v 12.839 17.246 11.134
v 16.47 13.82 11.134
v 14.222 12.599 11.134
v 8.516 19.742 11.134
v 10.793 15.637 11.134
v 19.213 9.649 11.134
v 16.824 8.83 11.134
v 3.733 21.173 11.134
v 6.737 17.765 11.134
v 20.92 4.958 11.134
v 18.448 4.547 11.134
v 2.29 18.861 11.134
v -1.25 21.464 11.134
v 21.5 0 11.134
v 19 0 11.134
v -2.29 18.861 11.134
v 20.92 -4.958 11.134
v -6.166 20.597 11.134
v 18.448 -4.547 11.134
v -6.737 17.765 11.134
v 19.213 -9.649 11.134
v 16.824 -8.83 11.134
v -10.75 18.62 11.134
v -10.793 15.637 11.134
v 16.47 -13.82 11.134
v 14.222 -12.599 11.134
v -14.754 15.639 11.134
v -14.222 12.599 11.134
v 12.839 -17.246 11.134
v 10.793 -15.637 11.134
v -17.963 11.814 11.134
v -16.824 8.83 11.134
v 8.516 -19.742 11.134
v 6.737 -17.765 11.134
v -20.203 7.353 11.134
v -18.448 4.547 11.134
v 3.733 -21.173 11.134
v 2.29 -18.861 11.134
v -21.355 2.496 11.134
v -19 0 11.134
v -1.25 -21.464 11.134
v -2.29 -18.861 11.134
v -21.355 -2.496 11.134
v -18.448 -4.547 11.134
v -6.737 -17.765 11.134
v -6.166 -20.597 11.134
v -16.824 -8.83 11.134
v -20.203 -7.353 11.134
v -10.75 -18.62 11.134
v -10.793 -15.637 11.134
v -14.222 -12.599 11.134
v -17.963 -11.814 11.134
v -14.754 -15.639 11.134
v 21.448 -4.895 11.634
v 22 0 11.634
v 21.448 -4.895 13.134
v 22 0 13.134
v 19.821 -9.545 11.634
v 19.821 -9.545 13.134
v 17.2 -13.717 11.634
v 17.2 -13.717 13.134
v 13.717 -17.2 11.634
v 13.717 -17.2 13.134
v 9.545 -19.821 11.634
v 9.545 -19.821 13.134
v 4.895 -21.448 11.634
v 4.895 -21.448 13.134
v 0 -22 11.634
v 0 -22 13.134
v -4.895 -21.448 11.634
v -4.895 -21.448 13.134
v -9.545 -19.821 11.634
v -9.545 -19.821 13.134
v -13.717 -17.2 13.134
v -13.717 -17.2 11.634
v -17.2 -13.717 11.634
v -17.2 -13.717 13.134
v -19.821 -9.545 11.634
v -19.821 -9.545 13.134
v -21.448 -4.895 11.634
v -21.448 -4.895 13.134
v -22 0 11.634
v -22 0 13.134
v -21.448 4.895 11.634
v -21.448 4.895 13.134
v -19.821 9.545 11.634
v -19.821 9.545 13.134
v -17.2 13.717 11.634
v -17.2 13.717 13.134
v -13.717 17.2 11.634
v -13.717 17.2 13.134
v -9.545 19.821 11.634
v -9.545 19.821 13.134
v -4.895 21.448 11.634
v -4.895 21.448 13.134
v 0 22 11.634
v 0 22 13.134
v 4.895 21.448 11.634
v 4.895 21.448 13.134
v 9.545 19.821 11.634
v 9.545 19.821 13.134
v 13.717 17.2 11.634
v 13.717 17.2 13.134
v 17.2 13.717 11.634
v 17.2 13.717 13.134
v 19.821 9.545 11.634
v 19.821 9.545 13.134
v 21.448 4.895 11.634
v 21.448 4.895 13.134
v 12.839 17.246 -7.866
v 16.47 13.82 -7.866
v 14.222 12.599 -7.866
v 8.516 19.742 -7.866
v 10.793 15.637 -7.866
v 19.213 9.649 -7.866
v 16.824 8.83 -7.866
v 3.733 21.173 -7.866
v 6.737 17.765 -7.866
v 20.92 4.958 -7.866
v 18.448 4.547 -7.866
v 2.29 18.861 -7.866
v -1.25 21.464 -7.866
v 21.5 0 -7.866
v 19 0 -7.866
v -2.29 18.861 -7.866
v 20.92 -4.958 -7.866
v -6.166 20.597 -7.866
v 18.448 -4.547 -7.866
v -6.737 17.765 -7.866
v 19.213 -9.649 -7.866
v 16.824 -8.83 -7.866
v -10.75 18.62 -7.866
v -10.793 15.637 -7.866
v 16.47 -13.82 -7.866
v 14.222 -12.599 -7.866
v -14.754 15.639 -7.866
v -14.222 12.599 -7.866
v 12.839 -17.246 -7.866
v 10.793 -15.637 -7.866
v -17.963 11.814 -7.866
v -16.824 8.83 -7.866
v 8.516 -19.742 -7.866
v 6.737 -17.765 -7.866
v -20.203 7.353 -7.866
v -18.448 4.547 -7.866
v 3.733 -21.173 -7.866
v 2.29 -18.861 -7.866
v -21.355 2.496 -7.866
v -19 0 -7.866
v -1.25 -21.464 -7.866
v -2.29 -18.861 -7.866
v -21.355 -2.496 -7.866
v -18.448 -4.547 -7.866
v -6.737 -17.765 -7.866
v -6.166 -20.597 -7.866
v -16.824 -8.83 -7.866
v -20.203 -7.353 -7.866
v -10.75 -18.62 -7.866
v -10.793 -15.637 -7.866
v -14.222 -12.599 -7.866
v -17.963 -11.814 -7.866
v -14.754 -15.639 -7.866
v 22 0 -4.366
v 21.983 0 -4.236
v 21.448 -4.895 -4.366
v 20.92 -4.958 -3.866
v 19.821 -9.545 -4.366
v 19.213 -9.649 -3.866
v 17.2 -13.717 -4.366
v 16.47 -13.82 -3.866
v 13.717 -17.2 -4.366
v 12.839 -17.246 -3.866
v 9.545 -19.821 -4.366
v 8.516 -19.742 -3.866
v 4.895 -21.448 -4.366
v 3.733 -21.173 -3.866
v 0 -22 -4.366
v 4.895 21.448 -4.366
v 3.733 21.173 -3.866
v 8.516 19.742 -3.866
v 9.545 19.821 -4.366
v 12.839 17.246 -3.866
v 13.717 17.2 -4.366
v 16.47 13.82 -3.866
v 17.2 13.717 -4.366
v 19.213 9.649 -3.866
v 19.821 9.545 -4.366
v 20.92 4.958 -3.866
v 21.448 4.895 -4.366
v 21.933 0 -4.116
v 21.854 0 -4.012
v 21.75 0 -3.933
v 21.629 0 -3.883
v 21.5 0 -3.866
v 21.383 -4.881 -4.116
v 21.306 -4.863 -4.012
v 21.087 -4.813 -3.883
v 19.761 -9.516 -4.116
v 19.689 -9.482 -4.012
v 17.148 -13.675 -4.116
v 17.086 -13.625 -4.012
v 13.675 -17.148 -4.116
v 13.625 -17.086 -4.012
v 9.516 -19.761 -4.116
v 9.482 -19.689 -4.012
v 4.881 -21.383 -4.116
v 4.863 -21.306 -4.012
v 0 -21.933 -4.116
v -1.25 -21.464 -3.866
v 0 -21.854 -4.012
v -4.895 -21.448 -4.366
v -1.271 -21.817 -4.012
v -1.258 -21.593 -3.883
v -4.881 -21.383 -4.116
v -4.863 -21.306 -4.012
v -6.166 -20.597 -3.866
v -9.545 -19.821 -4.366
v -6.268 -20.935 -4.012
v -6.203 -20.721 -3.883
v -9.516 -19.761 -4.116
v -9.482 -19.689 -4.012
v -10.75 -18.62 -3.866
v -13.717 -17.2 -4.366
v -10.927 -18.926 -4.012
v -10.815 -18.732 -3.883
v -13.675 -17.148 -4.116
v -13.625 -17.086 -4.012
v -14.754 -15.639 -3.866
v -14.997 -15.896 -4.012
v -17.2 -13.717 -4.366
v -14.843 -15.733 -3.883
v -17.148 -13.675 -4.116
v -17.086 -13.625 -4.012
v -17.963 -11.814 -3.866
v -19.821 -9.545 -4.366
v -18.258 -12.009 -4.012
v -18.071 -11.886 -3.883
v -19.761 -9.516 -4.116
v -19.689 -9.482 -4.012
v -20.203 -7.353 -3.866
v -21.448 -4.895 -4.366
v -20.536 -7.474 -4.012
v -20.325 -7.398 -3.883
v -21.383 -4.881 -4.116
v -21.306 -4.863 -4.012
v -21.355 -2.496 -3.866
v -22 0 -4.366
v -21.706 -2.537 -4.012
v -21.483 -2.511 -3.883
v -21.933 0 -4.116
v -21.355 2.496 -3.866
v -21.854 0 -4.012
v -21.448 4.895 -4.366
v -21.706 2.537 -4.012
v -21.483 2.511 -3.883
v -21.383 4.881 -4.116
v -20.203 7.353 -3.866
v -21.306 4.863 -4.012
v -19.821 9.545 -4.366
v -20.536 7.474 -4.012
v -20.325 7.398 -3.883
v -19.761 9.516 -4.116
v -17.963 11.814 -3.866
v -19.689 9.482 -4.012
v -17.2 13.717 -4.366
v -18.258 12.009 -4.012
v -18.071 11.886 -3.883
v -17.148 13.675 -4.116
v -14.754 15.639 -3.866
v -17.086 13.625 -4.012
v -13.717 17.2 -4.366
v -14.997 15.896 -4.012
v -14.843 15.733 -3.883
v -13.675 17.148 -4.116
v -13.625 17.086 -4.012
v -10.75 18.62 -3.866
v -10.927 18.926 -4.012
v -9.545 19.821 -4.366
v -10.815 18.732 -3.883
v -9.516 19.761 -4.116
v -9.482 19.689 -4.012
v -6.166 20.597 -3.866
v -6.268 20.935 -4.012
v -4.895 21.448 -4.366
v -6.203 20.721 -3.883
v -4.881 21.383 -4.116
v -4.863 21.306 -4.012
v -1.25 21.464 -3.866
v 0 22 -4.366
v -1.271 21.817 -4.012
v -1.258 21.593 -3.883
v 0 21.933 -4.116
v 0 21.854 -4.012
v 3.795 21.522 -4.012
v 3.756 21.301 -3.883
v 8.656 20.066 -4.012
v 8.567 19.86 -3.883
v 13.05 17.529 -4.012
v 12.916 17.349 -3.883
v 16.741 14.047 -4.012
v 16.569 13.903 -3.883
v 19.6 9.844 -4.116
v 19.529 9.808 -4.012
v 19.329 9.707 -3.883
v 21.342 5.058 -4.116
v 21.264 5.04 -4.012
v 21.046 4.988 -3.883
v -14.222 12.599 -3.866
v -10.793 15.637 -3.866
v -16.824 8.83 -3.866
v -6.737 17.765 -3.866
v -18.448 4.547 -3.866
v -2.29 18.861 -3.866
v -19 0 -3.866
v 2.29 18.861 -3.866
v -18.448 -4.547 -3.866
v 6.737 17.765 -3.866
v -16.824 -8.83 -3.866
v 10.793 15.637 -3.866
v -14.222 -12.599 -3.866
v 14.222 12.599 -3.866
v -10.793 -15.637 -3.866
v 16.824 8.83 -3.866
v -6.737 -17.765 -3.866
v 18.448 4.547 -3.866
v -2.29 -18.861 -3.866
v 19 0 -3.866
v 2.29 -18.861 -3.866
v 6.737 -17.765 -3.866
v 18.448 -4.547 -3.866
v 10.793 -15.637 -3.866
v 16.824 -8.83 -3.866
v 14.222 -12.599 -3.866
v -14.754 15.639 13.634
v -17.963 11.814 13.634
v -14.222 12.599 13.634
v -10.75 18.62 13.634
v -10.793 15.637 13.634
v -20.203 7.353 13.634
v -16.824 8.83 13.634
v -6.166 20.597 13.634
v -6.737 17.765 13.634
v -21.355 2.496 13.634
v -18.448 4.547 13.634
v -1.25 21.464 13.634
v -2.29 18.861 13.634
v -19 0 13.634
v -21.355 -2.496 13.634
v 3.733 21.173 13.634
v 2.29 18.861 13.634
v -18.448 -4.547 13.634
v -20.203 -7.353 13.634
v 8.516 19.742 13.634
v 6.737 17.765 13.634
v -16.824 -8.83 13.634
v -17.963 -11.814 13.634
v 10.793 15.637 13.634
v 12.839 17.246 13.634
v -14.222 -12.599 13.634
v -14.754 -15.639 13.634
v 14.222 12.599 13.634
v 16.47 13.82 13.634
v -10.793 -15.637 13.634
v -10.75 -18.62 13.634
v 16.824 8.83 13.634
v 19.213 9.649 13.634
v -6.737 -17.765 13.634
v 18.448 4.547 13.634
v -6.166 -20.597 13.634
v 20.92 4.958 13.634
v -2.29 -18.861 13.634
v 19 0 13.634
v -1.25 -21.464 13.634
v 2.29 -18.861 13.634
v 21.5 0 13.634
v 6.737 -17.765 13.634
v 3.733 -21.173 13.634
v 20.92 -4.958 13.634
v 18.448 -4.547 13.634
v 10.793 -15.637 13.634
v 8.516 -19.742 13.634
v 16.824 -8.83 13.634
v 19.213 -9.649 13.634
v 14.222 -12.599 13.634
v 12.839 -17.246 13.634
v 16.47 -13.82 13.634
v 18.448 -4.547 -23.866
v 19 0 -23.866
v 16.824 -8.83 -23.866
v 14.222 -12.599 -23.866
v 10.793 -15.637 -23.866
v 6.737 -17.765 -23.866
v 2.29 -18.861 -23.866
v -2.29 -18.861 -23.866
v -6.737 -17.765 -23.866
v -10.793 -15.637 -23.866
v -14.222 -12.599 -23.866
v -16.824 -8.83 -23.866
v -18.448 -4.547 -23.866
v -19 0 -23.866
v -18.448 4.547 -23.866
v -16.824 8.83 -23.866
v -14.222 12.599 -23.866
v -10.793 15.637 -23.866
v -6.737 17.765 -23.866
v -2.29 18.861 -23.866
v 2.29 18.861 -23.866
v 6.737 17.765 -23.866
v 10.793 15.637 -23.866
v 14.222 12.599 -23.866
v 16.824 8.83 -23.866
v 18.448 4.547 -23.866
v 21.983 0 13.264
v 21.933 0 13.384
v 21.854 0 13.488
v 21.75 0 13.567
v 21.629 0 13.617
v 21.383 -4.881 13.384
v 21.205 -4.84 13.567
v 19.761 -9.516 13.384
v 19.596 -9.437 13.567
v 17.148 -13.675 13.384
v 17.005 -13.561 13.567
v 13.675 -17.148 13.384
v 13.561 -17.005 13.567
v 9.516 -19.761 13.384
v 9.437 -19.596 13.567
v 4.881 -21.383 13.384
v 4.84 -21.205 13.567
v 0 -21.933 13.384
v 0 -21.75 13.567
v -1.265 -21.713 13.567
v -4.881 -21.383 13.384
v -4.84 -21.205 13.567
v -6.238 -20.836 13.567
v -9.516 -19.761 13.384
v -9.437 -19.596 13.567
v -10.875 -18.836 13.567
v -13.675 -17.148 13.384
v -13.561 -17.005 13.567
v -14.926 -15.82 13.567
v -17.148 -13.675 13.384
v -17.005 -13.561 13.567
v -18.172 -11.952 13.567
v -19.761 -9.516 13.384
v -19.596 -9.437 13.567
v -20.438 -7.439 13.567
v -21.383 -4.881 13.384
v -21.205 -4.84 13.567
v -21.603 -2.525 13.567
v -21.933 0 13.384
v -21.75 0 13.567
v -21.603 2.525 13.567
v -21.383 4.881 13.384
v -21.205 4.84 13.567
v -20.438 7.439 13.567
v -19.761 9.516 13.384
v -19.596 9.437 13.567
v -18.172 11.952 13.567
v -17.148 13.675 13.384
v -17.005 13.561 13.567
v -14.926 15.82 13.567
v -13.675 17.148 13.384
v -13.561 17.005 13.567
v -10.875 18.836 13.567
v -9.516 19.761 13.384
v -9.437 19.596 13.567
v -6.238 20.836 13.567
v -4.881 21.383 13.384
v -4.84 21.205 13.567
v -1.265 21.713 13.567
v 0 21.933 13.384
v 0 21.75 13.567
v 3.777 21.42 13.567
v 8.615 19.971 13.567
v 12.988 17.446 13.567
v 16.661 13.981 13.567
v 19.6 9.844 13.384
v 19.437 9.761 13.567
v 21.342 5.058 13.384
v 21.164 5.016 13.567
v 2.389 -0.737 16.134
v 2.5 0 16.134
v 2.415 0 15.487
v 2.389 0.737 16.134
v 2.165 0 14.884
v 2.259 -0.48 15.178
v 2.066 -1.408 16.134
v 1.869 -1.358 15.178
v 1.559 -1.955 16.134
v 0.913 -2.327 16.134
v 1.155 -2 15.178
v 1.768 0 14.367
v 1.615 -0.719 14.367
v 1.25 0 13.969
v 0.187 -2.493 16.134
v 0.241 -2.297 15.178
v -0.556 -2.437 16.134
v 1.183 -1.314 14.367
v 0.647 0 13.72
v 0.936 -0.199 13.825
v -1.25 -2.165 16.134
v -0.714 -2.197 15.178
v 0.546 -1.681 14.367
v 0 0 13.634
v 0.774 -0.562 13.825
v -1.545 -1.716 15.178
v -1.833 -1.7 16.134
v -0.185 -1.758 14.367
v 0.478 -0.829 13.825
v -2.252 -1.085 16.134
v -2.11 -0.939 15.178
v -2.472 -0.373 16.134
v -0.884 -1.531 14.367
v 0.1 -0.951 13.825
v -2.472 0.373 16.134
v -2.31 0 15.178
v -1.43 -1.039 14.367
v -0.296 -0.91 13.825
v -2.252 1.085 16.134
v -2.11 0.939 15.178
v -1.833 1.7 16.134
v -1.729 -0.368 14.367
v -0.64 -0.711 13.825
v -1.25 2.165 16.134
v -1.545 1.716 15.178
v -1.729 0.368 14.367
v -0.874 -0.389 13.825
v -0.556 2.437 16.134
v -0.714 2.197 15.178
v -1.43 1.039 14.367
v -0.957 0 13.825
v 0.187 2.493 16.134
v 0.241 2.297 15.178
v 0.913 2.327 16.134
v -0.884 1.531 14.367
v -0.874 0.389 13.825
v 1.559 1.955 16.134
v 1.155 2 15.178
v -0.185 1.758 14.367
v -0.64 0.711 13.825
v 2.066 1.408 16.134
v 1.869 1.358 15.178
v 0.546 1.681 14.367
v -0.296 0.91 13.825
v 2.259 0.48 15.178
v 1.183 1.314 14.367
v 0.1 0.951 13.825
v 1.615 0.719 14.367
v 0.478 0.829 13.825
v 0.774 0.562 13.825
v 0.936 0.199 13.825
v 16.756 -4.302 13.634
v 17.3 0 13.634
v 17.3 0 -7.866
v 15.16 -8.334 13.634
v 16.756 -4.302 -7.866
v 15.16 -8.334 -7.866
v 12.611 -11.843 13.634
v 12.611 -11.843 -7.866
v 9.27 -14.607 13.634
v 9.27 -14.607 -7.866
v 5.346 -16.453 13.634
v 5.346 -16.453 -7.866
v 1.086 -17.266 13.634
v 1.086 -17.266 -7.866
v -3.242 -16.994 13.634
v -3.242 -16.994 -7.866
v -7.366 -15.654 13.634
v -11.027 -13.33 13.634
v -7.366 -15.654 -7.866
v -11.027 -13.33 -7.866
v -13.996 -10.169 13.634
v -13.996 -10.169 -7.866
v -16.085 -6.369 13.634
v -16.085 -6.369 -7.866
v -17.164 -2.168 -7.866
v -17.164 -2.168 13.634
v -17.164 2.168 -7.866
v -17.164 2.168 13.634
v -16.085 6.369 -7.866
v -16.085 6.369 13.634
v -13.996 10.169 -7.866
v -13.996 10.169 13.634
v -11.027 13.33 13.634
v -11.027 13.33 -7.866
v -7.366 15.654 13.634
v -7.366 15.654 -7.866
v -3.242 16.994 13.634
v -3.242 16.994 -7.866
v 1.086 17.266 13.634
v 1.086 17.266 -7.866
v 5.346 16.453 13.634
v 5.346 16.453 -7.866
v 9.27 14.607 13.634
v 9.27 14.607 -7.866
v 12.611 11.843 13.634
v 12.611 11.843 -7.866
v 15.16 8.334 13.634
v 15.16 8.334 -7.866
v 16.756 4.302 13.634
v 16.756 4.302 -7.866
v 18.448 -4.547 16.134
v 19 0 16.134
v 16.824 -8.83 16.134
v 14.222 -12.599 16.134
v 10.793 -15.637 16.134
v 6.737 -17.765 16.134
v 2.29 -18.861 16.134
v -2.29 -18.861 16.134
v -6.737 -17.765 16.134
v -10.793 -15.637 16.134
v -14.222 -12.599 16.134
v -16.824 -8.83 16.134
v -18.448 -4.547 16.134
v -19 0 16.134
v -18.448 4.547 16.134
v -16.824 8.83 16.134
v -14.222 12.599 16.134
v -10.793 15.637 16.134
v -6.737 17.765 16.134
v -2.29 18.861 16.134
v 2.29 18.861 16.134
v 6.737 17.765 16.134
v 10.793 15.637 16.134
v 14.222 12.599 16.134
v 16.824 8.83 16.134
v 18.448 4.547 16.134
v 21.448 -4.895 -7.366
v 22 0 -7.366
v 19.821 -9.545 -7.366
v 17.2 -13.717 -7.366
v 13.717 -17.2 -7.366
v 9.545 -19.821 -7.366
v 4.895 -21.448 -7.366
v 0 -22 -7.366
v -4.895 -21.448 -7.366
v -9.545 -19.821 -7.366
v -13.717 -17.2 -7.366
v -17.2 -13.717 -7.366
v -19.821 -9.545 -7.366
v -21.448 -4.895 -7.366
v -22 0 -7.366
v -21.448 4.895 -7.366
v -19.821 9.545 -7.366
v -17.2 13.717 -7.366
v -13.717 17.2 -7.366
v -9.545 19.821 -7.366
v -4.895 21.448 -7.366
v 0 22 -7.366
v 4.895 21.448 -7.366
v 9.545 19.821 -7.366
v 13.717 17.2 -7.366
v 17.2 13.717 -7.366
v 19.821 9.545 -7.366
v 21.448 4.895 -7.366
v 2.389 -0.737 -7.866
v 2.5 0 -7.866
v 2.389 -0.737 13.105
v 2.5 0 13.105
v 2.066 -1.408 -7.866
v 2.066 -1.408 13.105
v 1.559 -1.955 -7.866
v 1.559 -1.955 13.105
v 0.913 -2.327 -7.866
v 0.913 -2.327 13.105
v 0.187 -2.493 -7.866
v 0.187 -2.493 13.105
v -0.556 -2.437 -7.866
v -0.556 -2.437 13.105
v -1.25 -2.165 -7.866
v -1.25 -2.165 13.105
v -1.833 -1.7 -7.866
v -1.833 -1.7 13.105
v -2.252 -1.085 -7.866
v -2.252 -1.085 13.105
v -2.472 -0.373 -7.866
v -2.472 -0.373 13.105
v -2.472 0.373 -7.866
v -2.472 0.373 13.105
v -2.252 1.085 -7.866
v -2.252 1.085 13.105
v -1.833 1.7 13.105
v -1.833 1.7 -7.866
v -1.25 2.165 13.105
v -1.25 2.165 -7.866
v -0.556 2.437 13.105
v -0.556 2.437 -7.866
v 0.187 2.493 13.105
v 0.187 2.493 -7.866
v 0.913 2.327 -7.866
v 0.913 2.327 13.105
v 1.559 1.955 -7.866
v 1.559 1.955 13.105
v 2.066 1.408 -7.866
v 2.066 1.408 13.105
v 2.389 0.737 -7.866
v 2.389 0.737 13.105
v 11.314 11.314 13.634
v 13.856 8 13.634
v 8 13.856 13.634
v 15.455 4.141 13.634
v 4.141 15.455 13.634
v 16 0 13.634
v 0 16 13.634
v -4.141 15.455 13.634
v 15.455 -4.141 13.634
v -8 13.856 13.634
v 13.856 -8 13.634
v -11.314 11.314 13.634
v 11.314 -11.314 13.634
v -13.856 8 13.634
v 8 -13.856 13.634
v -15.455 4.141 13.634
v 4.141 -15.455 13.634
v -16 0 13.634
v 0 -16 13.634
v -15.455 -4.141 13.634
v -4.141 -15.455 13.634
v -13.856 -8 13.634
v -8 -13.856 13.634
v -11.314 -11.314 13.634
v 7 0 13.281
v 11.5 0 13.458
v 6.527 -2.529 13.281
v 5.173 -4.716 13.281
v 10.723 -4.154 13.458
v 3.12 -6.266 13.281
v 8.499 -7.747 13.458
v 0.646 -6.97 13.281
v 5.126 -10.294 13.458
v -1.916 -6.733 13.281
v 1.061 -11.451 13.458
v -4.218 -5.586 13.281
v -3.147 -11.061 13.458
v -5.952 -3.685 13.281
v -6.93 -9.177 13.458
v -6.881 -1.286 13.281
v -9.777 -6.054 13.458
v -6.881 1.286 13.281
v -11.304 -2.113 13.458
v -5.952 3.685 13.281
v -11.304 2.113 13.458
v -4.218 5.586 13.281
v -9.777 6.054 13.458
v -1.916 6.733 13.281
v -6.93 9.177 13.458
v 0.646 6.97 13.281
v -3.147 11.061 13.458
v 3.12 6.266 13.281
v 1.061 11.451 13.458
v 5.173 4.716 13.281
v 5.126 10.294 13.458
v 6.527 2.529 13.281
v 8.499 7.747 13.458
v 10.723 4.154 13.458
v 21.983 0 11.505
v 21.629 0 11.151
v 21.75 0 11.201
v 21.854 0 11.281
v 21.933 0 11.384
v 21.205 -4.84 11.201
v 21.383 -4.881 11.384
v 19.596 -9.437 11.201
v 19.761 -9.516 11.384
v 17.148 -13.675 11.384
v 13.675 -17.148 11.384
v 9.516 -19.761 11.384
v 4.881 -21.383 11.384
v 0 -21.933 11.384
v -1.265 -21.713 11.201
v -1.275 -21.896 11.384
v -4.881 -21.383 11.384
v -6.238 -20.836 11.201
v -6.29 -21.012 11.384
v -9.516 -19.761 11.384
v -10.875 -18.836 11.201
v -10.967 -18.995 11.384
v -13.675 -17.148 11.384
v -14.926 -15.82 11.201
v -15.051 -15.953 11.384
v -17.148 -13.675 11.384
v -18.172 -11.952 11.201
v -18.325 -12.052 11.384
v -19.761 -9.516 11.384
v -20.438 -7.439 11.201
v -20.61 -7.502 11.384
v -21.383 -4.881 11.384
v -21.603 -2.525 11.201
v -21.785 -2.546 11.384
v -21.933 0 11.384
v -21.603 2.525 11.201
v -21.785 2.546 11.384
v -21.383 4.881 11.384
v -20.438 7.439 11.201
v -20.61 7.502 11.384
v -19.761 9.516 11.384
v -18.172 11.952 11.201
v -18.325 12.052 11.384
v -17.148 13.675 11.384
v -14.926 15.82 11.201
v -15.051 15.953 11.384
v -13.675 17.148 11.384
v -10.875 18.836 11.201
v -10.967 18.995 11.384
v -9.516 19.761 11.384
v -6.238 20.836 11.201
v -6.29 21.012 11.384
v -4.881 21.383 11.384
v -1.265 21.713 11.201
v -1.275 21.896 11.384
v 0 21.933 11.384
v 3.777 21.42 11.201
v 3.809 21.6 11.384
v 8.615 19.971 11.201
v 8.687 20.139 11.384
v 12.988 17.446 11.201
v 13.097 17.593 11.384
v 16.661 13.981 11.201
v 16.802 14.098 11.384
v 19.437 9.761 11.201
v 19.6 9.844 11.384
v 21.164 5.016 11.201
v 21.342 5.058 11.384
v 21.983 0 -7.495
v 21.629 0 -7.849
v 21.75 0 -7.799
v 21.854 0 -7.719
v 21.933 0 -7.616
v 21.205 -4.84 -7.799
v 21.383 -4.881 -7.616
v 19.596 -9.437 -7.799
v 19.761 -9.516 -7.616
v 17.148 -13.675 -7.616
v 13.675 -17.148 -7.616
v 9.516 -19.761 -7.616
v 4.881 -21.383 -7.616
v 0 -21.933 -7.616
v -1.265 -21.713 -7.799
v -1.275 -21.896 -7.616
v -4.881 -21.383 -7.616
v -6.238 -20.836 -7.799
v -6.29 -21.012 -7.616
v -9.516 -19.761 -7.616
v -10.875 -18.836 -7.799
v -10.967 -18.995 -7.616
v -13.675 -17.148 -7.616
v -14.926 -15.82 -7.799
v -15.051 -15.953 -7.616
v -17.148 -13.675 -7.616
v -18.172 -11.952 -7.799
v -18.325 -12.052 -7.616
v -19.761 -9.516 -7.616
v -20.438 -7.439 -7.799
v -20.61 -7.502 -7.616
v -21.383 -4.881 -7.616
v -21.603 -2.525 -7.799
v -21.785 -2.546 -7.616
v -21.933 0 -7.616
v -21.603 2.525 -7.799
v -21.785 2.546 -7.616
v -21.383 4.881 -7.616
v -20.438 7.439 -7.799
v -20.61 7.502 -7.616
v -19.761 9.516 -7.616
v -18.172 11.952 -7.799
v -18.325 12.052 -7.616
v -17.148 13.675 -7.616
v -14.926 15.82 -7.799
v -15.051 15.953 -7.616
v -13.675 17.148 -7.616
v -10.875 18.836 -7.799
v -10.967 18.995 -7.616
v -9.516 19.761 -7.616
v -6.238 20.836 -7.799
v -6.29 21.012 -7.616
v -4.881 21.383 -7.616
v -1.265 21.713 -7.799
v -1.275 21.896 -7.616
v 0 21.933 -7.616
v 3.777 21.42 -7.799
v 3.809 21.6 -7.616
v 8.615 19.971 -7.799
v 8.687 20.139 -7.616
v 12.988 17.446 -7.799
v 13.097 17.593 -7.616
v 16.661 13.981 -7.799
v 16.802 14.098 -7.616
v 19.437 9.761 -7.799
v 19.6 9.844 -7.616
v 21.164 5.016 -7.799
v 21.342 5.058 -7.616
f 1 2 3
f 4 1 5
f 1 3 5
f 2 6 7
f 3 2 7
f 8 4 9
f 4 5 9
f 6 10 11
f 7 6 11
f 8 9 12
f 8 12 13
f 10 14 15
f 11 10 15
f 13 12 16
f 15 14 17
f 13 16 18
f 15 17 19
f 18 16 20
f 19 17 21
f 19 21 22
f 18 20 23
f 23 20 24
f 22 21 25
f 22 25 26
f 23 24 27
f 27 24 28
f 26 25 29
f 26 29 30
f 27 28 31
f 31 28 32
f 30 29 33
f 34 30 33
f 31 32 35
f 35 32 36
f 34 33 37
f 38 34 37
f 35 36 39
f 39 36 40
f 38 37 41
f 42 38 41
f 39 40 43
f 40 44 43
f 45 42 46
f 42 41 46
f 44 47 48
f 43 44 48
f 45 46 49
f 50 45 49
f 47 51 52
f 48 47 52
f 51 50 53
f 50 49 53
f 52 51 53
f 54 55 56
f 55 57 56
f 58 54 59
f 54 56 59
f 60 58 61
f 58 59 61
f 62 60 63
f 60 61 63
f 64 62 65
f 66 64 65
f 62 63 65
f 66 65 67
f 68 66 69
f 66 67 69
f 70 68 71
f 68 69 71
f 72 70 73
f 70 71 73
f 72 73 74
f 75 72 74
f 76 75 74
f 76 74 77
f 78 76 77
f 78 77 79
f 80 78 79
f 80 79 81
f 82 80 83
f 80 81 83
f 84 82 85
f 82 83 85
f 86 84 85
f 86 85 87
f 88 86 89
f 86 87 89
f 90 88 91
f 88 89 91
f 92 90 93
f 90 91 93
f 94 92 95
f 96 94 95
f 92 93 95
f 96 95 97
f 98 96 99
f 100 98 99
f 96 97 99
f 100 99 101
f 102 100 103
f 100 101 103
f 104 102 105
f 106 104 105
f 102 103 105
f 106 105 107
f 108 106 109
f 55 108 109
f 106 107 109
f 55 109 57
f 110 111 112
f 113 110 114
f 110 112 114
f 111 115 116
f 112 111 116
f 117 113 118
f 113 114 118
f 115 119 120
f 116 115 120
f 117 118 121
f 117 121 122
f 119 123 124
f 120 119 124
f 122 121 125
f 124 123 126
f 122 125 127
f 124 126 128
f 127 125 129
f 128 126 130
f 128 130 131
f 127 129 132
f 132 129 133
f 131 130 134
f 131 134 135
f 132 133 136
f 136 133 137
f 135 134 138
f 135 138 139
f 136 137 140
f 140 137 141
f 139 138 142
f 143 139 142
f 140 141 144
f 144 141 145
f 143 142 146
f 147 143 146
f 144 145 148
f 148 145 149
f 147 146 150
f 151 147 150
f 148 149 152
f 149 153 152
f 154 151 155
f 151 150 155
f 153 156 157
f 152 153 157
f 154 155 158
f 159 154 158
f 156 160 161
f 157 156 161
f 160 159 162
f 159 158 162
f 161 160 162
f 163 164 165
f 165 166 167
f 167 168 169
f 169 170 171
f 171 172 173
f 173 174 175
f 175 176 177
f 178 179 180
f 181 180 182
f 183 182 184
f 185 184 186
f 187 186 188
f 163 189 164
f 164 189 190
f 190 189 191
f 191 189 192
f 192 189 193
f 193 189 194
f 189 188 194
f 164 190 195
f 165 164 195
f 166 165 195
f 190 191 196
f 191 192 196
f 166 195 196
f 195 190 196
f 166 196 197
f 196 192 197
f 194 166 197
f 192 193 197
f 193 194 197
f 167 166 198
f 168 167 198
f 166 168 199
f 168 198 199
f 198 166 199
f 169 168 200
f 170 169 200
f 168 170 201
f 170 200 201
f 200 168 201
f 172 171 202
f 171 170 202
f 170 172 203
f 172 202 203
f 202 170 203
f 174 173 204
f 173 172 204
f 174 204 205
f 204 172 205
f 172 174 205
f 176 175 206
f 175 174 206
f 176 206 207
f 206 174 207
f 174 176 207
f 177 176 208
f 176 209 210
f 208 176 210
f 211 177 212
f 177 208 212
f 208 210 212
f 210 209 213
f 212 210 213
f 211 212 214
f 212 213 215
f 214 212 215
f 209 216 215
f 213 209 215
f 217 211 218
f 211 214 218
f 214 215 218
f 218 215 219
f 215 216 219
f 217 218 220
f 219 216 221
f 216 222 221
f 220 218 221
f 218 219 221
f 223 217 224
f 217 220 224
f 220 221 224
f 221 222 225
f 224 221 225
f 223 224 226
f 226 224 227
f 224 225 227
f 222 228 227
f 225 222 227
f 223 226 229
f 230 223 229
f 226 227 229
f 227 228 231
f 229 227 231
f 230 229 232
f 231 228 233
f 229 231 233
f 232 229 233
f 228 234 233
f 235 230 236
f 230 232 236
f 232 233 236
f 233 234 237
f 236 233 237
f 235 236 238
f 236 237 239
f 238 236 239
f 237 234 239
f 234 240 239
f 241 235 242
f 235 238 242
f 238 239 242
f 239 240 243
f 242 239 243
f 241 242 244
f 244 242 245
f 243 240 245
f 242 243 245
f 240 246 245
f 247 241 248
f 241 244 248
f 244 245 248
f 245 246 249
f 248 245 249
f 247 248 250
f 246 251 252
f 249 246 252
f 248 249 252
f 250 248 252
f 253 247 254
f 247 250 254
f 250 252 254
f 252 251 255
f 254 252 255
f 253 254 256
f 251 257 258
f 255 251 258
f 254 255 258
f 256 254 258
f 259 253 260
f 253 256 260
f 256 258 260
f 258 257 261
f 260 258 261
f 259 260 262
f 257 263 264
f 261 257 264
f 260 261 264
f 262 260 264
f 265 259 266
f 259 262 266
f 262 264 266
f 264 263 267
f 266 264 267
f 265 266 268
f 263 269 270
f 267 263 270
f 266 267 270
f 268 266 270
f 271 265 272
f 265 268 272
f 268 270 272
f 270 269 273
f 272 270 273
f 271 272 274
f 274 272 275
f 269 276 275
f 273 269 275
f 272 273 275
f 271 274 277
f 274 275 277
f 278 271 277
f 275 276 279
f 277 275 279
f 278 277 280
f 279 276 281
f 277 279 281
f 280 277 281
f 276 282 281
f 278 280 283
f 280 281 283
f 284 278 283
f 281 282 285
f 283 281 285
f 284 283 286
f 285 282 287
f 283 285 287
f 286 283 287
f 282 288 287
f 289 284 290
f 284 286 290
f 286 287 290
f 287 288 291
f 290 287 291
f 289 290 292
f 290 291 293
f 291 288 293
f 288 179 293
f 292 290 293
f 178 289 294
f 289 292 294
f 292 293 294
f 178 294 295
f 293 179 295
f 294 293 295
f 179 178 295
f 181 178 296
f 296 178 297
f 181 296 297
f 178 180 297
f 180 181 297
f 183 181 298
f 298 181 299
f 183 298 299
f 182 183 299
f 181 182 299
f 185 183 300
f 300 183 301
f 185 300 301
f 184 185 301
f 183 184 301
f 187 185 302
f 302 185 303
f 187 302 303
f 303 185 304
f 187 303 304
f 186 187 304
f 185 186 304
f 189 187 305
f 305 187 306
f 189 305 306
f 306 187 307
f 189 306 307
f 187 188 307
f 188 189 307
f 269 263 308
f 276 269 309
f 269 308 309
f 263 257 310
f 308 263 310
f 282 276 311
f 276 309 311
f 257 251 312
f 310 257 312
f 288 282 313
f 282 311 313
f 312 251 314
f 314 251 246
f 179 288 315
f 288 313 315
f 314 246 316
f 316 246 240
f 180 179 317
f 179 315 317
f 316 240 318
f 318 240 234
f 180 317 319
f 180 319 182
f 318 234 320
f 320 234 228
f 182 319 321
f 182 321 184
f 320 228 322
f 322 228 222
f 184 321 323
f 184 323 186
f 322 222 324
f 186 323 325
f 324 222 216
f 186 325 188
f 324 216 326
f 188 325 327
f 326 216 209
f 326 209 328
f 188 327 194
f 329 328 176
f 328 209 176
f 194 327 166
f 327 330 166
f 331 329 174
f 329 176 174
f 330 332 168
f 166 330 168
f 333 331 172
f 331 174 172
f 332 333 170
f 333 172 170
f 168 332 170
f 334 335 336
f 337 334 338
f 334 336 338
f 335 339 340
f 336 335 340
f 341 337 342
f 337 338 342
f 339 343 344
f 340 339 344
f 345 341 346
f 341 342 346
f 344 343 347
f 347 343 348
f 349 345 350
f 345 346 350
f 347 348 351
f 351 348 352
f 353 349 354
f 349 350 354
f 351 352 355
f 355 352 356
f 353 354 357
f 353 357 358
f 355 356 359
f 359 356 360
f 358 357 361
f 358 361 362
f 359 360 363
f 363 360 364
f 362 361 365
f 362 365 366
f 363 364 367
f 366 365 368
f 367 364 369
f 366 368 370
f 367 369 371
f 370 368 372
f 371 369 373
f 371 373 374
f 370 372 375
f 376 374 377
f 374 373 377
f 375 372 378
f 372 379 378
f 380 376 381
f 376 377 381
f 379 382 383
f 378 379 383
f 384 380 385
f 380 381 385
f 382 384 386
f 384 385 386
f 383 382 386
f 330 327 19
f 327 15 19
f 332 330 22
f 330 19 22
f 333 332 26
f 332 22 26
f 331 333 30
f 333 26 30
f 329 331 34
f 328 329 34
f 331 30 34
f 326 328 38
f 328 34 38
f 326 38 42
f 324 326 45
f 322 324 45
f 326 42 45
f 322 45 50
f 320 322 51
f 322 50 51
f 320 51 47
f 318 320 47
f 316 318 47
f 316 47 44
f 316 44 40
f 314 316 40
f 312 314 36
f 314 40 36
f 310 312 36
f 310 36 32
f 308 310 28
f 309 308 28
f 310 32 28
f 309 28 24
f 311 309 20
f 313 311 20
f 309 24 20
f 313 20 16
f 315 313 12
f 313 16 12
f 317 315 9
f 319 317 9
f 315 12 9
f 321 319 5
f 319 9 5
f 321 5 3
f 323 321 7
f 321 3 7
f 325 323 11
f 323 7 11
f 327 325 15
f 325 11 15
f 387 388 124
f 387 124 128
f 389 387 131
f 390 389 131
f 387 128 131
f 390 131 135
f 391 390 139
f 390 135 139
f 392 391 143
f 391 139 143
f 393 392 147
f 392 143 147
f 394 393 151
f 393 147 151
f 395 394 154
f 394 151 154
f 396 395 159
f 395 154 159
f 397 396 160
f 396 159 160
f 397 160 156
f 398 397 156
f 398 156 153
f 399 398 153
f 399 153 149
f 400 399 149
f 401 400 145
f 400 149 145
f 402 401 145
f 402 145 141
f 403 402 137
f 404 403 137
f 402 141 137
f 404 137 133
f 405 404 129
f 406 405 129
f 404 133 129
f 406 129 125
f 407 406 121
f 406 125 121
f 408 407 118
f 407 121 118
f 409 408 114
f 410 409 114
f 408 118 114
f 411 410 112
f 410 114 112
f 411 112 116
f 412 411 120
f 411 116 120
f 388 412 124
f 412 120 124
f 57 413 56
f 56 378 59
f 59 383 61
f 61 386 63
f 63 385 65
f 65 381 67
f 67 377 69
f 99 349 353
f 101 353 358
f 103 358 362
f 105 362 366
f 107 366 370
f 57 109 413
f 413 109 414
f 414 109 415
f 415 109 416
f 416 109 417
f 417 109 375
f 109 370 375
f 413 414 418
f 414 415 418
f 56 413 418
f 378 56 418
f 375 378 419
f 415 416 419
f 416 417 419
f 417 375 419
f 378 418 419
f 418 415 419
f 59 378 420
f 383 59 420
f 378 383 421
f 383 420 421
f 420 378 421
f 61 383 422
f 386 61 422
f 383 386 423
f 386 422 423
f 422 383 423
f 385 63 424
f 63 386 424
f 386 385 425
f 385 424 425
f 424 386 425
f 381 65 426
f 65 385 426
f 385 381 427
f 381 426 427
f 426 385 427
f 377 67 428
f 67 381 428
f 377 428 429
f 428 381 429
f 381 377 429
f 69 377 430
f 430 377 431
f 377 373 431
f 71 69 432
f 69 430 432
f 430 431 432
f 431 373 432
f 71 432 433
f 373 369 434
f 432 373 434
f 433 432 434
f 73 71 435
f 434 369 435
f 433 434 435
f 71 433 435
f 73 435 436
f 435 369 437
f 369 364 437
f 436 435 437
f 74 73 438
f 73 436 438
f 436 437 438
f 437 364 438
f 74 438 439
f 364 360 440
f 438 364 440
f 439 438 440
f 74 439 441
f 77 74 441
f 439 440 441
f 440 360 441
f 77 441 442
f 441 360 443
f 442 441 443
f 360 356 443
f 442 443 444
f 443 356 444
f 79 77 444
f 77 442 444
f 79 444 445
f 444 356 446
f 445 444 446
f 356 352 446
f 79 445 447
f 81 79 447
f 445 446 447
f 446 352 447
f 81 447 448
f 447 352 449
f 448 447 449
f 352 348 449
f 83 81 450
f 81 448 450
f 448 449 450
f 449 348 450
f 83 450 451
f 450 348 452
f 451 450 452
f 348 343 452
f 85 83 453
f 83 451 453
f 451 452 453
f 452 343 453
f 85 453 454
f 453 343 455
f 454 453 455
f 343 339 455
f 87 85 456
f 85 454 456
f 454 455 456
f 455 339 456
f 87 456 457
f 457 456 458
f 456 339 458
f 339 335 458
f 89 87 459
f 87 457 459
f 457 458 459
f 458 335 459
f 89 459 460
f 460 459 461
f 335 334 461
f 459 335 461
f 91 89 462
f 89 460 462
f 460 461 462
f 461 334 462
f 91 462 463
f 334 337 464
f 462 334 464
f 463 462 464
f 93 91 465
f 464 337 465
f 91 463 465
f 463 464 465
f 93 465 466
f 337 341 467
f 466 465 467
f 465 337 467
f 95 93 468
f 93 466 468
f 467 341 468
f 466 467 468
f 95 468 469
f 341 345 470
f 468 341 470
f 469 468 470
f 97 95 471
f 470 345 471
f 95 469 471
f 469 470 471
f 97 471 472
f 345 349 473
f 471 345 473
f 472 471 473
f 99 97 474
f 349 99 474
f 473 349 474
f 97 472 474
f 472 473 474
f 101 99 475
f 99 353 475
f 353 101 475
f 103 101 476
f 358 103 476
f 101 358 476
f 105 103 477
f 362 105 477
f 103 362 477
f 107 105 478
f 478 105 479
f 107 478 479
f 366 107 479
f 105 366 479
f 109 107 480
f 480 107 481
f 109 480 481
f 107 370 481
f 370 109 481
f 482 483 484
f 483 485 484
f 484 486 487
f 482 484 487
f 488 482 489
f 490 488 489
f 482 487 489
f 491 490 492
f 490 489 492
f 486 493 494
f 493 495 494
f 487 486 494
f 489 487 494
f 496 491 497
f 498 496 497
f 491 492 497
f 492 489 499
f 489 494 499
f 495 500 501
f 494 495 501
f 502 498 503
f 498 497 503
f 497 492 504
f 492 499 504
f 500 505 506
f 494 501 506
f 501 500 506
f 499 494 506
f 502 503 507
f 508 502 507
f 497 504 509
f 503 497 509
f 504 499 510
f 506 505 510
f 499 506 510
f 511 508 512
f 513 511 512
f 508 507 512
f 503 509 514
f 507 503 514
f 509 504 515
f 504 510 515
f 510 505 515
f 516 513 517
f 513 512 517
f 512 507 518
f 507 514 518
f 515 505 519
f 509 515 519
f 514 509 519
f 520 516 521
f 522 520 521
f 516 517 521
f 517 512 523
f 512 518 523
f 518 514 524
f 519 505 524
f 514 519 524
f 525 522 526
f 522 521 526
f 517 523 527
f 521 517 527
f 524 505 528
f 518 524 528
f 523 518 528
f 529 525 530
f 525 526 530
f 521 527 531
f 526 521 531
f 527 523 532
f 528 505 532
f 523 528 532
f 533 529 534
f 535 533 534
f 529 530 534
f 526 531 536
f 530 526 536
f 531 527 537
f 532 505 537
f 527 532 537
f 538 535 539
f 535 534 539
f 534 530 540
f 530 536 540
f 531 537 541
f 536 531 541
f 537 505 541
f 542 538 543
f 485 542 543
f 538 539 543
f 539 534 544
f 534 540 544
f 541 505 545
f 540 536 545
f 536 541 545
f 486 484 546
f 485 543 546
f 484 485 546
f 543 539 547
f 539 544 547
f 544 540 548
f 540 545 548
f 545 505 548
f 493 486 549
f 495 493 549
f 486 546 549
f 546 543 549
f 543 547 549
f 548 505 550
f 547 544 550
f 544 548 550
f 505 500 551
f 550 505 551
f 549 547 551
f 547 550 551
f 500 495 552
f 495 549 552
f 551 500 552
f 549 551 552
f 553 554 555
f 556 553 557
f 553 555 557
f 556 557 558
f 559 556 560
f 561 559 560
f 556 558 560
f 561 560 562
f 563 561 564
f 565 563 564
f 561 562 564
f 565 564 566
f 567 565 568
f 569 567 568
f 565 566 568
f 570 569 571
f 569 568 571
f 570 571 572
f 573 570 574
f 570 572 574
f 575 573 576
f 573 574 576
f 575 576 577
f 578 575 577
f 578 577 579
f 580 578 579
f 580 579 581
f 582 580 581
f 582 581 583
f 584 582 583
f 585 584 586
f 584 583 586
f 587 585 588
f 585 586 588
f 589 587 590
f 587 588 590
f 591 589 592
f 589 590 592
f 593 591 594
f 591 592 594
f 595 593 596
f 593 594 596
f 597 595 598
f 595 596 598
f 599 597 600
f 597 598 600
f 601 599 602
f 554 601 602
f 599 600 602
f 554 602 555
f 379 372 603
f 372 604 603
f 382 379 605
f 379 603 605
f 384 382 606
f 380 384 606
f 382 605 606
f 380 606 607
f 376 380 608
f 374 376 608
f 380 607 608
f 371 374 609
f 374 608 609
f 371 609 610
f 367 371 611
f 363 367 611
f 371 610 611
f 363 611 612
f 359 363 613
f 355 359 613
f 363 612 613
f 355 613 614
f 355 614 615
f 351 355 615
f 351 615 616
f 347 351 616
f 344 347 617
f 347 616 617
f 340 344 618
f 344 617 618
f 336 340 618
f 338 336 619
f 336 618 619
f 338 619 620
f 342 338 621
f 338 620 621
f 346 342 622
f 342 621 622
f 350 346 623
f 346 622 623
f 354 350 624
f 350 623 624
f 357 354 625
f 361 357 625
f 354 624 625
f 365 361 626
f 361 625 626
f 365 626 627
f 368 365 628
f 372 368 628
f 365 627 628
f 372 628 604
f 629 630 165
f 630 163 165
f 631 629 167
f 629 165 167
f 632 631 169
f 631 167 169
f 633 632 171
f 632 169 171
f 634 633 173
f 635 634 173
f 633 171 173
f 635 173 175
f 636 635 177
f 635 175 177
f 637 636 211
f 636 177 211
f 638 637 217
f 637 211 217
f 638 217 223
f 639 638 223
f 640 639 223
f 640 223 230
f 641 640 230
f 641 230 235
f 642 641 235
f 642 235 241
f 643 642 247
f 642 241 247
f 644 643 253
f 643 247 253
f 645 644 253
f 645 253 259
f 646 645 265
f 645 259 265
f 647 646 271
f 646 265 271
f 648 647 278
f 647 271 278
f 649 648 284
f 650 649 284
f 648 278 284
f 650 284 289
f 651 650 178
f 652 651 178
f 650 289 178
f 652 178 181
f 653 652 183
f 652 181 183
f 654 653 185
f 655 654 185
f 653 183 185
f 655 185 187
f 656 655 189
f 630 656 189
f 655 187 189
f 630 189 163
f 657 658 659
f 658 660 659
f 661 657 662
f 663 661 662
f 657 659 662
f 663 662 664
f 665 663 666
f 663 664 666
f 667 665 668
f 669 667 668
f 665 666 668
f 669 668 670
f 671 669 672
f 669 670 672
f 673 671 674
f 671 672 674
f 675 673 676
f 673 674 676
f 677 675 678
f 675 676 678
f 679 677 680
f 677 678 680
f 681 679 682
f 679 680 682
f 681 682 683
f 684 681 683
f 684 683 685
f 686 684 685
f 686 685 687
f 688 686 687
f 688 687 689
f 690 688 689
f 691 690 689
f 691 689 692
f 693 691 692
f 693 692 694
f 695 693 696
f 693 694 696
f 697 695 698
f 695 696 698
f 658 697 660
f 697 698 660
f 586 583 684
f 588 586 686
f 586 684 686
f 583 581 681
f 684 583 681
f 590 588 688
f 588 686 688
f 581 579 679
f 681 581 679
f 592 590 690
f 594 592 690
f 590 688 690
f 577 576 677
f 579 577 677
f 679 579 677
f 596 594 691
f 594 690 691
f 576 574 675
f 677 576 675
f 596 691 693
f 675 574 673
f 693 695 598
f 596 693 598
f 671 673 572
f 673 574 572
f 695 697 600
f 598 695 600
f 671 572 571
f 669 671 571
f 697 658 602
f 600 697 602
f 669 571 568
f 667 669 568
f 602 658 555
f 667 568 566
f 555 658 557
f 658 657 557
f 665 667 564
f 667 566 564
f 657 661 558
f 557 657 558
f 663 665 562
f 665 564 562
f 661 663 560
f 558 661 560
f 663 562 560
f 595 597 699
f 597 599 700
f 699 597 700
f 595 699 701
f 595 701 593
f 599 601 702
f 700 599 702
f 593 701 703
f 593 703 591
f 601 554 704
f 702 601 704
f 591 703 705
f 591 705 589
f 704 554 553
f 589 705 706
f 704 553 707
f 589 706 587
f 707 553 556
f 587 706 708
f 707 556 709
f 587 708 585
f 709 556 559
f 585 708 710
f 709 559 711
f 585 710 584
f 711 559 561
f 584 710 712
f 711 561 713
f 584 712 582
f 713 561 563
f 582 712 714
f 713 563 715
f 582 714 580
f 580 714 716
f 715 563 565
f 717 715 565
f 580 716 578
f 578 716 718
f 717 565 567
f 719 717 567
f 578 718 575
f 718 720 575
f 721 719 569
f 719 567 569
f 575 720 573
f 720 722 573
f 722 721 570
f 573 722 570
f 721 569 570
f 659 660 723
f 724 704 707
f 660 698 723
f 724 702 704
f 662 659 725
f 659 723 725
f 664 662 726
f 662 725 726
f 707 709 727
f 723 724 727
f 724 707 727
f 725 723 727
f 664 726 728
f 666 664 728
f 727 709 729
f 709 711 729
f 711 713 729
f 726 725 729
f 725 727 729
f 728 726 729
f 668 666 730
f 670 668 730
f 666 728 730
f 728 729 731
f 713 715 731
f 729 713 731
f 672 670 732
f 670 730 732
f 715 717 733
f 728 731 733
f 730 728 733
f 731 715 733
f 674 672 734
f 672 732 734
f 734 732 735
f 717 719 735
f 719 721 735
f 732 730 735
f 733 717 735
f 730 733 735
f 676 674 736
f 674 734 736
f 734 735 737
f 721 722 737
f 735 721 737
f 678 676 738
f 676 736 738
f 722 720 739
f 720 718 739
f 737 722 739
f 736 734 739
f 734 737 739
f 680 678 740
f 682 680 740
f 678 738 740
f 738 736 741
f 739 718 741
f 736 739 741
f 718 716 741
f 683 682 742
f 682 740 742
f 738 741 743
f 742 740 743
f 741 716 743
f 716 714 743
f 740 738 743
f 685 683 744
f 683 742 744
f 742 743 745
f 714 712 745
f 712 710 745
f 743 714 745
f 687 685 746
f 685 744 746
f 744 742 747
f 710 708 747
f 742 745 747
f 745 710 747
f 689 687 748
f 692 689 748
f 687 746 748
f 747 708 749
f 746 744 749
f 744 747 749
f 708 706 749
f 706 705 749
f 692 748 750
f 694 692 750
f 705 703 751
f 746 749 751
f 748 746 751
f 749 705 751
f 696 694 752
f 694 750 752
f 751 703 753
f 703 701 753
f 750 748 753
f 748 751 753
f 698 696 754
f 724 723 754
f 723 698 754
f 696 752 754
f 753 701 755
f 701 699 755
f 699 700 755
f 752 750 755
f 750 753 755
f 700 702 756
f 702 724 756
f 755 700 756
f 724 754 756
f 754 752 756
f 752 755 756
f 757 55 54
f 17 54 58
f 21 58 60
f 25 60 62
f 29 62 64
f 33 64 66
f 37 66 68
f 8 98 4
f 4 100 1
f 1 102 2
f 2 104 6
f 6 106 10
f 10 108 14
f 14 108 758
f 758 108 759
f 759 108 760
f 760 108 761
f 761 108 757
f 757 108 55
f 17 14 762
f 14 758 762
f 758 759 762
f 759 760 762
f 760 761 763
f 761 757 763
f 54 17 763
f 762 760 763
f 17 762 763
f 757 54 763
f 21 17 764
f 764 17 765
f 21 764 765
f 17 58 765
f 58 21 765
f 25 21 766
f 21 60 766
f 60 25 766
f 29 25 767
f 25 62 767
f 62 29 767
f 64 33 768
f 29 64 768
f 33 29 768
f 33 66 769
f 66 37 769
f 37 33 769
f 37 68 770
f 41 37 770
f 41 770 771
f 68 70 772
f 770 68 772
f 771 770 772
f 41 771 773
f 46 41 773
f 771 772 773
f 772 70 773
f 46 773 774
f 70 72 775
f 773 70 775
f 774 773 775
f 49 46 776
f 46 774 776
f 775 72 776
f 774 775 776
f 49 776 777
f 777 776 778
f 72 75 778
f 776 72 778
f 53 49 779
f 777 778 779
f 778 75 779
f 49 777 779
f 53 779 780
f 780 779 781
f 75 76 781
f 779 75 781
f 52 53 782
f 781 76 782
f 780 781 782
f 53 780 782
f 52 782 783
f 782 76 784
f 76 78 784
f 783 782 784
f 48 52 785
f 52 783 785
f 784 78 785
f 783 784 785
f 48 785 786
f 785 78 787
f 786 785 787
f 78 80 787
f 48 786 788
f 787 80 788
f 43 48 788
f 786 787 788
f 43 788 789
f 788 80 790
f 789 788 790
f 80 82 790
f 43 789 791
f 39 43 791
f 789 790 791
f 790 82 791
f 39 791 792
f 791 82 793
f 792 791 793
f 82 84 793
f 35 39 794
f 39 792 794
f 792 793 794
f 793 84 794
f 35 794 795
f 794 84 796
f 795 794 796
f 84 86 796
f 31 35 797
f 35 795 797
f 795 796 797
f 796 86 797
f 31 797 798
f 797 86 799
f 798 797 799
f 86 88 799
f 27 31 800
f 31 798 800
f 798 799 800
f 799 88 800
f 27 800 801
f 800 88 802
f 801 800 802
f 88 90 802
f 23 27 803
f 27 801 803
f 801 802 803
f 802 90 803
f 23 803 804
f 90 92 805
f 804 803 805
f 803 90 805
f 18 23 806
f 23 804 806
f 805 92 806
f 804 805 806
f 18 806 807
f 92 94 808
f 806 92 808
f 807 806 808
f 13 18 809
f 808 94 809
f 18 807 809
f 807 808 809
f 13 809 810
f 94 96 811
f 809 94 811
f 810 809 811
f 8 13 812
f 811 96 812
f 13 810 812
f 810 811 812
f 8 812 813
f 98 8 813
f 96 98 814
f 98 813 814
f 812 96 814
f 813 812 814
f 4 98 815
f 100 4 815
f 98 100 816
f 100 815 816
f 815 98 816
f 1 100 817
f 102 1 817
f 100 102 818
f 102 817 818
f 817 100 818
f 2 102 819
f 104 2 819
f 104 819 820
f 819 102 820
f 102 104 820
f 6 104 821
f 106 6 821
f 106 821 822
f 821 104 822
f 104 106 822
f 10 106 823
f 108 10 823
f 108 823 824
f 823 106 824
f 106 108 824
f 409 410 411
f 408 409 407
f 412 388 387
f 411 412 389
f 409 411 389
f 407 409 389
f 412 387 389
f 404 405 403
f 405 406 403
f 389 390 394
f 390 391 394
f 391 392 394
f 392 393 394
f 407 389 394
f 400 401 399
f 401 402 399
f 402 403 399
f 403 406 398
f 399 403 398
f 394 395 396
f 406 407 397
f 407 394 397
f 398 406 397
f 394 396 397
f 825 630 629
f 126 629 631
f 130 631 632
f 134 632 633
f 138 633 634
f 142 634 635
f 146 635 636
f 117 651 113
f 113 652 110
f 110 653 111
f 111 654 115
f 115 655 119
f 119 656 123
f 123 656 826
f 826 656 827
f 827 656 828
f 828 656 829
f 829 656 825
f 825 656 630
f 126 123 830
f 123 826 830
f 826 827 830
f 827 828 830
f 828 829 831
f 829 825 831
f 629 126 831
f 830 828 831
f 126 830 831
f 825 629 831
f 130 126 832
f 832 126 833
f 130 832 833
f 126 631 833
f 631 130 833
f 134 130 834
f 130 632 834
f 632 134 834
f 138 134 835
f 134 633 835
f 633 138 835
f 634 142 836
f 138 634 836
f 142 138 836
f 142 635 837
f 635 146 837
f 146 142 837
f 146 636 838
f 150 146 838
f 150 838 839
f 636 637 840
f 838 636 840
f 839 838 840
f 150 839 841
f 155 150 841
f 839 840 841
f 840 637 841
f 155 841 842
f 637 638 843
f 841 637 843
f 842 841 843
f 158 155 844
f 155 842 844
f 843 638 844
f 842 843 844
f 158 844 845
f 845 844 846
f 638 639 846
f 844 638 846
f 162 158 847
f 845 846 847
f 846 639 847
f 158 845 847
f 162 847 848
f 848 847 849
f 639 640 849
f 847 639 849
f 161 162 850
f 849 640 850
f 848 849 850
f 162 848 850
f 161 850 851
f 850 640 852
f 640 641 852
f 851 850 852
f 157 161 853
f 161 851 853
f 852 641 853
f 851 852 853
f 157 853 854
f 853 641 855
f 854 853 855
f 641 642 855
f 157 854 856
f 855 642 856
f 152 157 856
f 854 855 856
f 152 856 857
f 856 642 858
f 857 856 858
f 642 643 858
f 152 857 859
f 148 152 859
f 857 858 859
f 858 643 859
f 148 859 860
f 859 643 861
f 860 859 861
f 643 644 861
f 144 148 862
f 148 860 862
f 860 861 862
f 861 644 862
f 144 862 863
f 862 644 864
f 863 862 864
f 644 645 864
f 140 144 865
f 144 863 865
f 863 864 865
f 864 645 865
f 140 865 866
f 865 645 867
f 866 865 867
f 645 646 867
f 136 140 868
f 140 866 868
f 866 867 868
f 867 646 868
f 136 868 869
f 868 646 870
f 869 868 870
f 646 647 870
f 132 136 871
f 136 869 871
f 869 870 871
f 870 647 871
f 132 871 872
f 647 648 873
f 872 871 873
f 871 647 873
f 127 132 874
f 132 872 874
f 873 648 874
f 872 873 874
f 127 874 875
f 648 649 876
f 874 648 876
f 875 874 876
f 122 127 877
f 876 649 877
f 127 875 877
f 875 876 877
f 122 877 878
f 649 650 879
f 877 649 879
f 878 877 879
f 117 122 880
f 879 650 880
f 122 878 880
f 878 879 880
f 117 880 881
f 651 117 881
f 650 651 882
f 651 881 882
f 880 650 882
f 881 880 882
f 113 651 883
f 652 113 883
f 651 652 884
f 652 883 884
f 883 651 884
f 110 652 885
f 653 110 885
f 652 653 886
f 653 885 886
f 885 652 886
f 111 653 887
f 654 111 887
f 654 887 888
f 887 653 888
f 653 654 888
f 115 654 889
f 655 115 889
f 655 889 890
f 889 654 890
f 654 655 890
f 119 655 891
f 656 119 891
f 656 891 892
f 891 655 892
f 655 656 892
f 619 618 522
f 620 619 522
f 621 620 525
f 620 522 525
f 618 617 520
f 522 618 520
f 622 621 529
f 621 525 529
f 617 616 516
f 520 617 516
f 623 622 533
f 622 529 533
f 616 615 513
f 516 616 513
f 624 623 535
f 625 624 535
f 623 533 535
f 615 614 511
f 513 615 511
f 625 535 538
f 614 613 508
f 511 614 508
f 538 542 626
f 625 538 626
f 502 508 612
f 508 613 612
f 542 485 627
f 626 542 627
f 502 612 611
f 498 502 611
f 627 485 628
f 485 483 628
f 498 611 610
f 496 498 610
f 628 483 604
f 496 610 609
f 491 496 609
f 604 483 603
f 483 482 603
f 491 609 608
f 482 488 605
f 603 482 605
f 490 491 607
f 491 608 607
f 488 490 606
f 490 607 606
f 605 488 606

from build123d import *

# Parameters (mm, degrees)
F0_W   = 1.3
F0_H   = 2.5
F0_W_2 = 1.7
F0_W_3 = 2.5
F0_H_2 = 10.6689085803
F0_H_3 = 3.8655457098
F0_H_4 = 4
F0_H_5 = 16
F0_W_4 = 13.5


with BuildPart() as f1:
    # F0 (on Front) → F1 (revolve)
    with BuildSketch(Plane.XZ):
        with Locations((16.65, 14.8844542902)):
            Rectangle(F0_W, F0_H)
        Polygon((16, 13.6344542902), (16, 16.1344542902), (2.5, 16.1344542902), (2.5, 13.1048886105), align=None)
        with Locations((18.15, 14.8844542902)):
            Rectangle(F0_W_2, F0_H)
        with BuildLine():
            Line((2.5, 13.1048886105), (2.5, 16.1344542902))
            ThreePointArc((2.5, 16.1344542902), (1.767766953, 14.3666873372), (0, 13.6344542902))
            Line((0, 13.6344542902), (0, 11.1344542902))
            Line((0, 11.1344542902), (0, 10.6689085803))
            Line((0, 10.6689085803), (2.5, 10.6689085803))
            Line((2.5, 10.6689085803), (2.5, 13.1048886105))
        make_face()
        with Locations((18.15, 12.3844542902)):
            Rectangle(F0_W_2, F0_H)
        with BuildLine():
            Line((21.5, 13.6344542902), (19, 13.6344542902))
            Line((19, 13.6344542902), (19, 11.1344542902))
            Line((19, 11.1344542902), (21.5, 11.1344542902))
            ThreePointArc((21.5, 11.1344542902), (21.8535533906, 11.2809008996), (22, 11.6344542902))
            Line((22, 11.6344542902), (22, 13.1344542902))
            ThreePointArc((22, 13.1344542902), (21.8535533906, 13.4880076808), (21.5, 13.6344542902))
        make_face()
        Polygon((19, 11.1344542902), (17.3, 11.1344542902), (17.3, 10.6689085803), (17.3, 6.6344542902), (17.3, 4.0344542902), (17.3, 0), (17.3, -3.8655457098), (19, -3.8655457098), align=None)
        with Locations((1.25, 5.3344542902)):
            Rectangle(F0_W_3, F0_H_2)
        with Locations((1.25, -1.9327728549)):
            Rectangle(F0_W_3, F0_H_3)
        with BuildLine():
            Line((21.5, -3.8655457098), (19, -3.8655457098))
            Line((19, -3.8655457098), (19, -7.8655457098))
            Line((19, -7.8655457098), (21.5, -7.8655457098))
            ThreePointArc((21.5, -7.8655457098), (21.8535533906, -7.7190991004), (22, -7.3655457098))
            Line((22, -7.3655457098), (22, -4.3655457098))
            ThreePointArc((22, -4.3655457098), (21.8535533906, -4.0119923192), (21.5, -3.8655457098))
        make_face()
        with Locations((18.15, -5.8655457098)):
            Rectangle(F0_W_2, F0_H_4)
        with Locations((1.25, -5.8655457098)):
            Rectangle(F0_W_3, F0_H_4)
        with Locations((18.15, -15.8655457098)):
            Rectangle(F0_W_2, F0_H_5)
        with Locations((9.25, -15.8655457098)):
            Rectangle(F0_W_4, F0_H_5)
        with Locations((1.25, -15.8655457098)):
            Rectangle(F0_W_3, F0_H_5)
        with Locations((16.65, -15.8655457098)):
            Rectangle(F0_W, F0_H_5)
    revolve(axis=Axis((0, 0, -3.389431617), (0, 0, -1)))


solid = f1.part
